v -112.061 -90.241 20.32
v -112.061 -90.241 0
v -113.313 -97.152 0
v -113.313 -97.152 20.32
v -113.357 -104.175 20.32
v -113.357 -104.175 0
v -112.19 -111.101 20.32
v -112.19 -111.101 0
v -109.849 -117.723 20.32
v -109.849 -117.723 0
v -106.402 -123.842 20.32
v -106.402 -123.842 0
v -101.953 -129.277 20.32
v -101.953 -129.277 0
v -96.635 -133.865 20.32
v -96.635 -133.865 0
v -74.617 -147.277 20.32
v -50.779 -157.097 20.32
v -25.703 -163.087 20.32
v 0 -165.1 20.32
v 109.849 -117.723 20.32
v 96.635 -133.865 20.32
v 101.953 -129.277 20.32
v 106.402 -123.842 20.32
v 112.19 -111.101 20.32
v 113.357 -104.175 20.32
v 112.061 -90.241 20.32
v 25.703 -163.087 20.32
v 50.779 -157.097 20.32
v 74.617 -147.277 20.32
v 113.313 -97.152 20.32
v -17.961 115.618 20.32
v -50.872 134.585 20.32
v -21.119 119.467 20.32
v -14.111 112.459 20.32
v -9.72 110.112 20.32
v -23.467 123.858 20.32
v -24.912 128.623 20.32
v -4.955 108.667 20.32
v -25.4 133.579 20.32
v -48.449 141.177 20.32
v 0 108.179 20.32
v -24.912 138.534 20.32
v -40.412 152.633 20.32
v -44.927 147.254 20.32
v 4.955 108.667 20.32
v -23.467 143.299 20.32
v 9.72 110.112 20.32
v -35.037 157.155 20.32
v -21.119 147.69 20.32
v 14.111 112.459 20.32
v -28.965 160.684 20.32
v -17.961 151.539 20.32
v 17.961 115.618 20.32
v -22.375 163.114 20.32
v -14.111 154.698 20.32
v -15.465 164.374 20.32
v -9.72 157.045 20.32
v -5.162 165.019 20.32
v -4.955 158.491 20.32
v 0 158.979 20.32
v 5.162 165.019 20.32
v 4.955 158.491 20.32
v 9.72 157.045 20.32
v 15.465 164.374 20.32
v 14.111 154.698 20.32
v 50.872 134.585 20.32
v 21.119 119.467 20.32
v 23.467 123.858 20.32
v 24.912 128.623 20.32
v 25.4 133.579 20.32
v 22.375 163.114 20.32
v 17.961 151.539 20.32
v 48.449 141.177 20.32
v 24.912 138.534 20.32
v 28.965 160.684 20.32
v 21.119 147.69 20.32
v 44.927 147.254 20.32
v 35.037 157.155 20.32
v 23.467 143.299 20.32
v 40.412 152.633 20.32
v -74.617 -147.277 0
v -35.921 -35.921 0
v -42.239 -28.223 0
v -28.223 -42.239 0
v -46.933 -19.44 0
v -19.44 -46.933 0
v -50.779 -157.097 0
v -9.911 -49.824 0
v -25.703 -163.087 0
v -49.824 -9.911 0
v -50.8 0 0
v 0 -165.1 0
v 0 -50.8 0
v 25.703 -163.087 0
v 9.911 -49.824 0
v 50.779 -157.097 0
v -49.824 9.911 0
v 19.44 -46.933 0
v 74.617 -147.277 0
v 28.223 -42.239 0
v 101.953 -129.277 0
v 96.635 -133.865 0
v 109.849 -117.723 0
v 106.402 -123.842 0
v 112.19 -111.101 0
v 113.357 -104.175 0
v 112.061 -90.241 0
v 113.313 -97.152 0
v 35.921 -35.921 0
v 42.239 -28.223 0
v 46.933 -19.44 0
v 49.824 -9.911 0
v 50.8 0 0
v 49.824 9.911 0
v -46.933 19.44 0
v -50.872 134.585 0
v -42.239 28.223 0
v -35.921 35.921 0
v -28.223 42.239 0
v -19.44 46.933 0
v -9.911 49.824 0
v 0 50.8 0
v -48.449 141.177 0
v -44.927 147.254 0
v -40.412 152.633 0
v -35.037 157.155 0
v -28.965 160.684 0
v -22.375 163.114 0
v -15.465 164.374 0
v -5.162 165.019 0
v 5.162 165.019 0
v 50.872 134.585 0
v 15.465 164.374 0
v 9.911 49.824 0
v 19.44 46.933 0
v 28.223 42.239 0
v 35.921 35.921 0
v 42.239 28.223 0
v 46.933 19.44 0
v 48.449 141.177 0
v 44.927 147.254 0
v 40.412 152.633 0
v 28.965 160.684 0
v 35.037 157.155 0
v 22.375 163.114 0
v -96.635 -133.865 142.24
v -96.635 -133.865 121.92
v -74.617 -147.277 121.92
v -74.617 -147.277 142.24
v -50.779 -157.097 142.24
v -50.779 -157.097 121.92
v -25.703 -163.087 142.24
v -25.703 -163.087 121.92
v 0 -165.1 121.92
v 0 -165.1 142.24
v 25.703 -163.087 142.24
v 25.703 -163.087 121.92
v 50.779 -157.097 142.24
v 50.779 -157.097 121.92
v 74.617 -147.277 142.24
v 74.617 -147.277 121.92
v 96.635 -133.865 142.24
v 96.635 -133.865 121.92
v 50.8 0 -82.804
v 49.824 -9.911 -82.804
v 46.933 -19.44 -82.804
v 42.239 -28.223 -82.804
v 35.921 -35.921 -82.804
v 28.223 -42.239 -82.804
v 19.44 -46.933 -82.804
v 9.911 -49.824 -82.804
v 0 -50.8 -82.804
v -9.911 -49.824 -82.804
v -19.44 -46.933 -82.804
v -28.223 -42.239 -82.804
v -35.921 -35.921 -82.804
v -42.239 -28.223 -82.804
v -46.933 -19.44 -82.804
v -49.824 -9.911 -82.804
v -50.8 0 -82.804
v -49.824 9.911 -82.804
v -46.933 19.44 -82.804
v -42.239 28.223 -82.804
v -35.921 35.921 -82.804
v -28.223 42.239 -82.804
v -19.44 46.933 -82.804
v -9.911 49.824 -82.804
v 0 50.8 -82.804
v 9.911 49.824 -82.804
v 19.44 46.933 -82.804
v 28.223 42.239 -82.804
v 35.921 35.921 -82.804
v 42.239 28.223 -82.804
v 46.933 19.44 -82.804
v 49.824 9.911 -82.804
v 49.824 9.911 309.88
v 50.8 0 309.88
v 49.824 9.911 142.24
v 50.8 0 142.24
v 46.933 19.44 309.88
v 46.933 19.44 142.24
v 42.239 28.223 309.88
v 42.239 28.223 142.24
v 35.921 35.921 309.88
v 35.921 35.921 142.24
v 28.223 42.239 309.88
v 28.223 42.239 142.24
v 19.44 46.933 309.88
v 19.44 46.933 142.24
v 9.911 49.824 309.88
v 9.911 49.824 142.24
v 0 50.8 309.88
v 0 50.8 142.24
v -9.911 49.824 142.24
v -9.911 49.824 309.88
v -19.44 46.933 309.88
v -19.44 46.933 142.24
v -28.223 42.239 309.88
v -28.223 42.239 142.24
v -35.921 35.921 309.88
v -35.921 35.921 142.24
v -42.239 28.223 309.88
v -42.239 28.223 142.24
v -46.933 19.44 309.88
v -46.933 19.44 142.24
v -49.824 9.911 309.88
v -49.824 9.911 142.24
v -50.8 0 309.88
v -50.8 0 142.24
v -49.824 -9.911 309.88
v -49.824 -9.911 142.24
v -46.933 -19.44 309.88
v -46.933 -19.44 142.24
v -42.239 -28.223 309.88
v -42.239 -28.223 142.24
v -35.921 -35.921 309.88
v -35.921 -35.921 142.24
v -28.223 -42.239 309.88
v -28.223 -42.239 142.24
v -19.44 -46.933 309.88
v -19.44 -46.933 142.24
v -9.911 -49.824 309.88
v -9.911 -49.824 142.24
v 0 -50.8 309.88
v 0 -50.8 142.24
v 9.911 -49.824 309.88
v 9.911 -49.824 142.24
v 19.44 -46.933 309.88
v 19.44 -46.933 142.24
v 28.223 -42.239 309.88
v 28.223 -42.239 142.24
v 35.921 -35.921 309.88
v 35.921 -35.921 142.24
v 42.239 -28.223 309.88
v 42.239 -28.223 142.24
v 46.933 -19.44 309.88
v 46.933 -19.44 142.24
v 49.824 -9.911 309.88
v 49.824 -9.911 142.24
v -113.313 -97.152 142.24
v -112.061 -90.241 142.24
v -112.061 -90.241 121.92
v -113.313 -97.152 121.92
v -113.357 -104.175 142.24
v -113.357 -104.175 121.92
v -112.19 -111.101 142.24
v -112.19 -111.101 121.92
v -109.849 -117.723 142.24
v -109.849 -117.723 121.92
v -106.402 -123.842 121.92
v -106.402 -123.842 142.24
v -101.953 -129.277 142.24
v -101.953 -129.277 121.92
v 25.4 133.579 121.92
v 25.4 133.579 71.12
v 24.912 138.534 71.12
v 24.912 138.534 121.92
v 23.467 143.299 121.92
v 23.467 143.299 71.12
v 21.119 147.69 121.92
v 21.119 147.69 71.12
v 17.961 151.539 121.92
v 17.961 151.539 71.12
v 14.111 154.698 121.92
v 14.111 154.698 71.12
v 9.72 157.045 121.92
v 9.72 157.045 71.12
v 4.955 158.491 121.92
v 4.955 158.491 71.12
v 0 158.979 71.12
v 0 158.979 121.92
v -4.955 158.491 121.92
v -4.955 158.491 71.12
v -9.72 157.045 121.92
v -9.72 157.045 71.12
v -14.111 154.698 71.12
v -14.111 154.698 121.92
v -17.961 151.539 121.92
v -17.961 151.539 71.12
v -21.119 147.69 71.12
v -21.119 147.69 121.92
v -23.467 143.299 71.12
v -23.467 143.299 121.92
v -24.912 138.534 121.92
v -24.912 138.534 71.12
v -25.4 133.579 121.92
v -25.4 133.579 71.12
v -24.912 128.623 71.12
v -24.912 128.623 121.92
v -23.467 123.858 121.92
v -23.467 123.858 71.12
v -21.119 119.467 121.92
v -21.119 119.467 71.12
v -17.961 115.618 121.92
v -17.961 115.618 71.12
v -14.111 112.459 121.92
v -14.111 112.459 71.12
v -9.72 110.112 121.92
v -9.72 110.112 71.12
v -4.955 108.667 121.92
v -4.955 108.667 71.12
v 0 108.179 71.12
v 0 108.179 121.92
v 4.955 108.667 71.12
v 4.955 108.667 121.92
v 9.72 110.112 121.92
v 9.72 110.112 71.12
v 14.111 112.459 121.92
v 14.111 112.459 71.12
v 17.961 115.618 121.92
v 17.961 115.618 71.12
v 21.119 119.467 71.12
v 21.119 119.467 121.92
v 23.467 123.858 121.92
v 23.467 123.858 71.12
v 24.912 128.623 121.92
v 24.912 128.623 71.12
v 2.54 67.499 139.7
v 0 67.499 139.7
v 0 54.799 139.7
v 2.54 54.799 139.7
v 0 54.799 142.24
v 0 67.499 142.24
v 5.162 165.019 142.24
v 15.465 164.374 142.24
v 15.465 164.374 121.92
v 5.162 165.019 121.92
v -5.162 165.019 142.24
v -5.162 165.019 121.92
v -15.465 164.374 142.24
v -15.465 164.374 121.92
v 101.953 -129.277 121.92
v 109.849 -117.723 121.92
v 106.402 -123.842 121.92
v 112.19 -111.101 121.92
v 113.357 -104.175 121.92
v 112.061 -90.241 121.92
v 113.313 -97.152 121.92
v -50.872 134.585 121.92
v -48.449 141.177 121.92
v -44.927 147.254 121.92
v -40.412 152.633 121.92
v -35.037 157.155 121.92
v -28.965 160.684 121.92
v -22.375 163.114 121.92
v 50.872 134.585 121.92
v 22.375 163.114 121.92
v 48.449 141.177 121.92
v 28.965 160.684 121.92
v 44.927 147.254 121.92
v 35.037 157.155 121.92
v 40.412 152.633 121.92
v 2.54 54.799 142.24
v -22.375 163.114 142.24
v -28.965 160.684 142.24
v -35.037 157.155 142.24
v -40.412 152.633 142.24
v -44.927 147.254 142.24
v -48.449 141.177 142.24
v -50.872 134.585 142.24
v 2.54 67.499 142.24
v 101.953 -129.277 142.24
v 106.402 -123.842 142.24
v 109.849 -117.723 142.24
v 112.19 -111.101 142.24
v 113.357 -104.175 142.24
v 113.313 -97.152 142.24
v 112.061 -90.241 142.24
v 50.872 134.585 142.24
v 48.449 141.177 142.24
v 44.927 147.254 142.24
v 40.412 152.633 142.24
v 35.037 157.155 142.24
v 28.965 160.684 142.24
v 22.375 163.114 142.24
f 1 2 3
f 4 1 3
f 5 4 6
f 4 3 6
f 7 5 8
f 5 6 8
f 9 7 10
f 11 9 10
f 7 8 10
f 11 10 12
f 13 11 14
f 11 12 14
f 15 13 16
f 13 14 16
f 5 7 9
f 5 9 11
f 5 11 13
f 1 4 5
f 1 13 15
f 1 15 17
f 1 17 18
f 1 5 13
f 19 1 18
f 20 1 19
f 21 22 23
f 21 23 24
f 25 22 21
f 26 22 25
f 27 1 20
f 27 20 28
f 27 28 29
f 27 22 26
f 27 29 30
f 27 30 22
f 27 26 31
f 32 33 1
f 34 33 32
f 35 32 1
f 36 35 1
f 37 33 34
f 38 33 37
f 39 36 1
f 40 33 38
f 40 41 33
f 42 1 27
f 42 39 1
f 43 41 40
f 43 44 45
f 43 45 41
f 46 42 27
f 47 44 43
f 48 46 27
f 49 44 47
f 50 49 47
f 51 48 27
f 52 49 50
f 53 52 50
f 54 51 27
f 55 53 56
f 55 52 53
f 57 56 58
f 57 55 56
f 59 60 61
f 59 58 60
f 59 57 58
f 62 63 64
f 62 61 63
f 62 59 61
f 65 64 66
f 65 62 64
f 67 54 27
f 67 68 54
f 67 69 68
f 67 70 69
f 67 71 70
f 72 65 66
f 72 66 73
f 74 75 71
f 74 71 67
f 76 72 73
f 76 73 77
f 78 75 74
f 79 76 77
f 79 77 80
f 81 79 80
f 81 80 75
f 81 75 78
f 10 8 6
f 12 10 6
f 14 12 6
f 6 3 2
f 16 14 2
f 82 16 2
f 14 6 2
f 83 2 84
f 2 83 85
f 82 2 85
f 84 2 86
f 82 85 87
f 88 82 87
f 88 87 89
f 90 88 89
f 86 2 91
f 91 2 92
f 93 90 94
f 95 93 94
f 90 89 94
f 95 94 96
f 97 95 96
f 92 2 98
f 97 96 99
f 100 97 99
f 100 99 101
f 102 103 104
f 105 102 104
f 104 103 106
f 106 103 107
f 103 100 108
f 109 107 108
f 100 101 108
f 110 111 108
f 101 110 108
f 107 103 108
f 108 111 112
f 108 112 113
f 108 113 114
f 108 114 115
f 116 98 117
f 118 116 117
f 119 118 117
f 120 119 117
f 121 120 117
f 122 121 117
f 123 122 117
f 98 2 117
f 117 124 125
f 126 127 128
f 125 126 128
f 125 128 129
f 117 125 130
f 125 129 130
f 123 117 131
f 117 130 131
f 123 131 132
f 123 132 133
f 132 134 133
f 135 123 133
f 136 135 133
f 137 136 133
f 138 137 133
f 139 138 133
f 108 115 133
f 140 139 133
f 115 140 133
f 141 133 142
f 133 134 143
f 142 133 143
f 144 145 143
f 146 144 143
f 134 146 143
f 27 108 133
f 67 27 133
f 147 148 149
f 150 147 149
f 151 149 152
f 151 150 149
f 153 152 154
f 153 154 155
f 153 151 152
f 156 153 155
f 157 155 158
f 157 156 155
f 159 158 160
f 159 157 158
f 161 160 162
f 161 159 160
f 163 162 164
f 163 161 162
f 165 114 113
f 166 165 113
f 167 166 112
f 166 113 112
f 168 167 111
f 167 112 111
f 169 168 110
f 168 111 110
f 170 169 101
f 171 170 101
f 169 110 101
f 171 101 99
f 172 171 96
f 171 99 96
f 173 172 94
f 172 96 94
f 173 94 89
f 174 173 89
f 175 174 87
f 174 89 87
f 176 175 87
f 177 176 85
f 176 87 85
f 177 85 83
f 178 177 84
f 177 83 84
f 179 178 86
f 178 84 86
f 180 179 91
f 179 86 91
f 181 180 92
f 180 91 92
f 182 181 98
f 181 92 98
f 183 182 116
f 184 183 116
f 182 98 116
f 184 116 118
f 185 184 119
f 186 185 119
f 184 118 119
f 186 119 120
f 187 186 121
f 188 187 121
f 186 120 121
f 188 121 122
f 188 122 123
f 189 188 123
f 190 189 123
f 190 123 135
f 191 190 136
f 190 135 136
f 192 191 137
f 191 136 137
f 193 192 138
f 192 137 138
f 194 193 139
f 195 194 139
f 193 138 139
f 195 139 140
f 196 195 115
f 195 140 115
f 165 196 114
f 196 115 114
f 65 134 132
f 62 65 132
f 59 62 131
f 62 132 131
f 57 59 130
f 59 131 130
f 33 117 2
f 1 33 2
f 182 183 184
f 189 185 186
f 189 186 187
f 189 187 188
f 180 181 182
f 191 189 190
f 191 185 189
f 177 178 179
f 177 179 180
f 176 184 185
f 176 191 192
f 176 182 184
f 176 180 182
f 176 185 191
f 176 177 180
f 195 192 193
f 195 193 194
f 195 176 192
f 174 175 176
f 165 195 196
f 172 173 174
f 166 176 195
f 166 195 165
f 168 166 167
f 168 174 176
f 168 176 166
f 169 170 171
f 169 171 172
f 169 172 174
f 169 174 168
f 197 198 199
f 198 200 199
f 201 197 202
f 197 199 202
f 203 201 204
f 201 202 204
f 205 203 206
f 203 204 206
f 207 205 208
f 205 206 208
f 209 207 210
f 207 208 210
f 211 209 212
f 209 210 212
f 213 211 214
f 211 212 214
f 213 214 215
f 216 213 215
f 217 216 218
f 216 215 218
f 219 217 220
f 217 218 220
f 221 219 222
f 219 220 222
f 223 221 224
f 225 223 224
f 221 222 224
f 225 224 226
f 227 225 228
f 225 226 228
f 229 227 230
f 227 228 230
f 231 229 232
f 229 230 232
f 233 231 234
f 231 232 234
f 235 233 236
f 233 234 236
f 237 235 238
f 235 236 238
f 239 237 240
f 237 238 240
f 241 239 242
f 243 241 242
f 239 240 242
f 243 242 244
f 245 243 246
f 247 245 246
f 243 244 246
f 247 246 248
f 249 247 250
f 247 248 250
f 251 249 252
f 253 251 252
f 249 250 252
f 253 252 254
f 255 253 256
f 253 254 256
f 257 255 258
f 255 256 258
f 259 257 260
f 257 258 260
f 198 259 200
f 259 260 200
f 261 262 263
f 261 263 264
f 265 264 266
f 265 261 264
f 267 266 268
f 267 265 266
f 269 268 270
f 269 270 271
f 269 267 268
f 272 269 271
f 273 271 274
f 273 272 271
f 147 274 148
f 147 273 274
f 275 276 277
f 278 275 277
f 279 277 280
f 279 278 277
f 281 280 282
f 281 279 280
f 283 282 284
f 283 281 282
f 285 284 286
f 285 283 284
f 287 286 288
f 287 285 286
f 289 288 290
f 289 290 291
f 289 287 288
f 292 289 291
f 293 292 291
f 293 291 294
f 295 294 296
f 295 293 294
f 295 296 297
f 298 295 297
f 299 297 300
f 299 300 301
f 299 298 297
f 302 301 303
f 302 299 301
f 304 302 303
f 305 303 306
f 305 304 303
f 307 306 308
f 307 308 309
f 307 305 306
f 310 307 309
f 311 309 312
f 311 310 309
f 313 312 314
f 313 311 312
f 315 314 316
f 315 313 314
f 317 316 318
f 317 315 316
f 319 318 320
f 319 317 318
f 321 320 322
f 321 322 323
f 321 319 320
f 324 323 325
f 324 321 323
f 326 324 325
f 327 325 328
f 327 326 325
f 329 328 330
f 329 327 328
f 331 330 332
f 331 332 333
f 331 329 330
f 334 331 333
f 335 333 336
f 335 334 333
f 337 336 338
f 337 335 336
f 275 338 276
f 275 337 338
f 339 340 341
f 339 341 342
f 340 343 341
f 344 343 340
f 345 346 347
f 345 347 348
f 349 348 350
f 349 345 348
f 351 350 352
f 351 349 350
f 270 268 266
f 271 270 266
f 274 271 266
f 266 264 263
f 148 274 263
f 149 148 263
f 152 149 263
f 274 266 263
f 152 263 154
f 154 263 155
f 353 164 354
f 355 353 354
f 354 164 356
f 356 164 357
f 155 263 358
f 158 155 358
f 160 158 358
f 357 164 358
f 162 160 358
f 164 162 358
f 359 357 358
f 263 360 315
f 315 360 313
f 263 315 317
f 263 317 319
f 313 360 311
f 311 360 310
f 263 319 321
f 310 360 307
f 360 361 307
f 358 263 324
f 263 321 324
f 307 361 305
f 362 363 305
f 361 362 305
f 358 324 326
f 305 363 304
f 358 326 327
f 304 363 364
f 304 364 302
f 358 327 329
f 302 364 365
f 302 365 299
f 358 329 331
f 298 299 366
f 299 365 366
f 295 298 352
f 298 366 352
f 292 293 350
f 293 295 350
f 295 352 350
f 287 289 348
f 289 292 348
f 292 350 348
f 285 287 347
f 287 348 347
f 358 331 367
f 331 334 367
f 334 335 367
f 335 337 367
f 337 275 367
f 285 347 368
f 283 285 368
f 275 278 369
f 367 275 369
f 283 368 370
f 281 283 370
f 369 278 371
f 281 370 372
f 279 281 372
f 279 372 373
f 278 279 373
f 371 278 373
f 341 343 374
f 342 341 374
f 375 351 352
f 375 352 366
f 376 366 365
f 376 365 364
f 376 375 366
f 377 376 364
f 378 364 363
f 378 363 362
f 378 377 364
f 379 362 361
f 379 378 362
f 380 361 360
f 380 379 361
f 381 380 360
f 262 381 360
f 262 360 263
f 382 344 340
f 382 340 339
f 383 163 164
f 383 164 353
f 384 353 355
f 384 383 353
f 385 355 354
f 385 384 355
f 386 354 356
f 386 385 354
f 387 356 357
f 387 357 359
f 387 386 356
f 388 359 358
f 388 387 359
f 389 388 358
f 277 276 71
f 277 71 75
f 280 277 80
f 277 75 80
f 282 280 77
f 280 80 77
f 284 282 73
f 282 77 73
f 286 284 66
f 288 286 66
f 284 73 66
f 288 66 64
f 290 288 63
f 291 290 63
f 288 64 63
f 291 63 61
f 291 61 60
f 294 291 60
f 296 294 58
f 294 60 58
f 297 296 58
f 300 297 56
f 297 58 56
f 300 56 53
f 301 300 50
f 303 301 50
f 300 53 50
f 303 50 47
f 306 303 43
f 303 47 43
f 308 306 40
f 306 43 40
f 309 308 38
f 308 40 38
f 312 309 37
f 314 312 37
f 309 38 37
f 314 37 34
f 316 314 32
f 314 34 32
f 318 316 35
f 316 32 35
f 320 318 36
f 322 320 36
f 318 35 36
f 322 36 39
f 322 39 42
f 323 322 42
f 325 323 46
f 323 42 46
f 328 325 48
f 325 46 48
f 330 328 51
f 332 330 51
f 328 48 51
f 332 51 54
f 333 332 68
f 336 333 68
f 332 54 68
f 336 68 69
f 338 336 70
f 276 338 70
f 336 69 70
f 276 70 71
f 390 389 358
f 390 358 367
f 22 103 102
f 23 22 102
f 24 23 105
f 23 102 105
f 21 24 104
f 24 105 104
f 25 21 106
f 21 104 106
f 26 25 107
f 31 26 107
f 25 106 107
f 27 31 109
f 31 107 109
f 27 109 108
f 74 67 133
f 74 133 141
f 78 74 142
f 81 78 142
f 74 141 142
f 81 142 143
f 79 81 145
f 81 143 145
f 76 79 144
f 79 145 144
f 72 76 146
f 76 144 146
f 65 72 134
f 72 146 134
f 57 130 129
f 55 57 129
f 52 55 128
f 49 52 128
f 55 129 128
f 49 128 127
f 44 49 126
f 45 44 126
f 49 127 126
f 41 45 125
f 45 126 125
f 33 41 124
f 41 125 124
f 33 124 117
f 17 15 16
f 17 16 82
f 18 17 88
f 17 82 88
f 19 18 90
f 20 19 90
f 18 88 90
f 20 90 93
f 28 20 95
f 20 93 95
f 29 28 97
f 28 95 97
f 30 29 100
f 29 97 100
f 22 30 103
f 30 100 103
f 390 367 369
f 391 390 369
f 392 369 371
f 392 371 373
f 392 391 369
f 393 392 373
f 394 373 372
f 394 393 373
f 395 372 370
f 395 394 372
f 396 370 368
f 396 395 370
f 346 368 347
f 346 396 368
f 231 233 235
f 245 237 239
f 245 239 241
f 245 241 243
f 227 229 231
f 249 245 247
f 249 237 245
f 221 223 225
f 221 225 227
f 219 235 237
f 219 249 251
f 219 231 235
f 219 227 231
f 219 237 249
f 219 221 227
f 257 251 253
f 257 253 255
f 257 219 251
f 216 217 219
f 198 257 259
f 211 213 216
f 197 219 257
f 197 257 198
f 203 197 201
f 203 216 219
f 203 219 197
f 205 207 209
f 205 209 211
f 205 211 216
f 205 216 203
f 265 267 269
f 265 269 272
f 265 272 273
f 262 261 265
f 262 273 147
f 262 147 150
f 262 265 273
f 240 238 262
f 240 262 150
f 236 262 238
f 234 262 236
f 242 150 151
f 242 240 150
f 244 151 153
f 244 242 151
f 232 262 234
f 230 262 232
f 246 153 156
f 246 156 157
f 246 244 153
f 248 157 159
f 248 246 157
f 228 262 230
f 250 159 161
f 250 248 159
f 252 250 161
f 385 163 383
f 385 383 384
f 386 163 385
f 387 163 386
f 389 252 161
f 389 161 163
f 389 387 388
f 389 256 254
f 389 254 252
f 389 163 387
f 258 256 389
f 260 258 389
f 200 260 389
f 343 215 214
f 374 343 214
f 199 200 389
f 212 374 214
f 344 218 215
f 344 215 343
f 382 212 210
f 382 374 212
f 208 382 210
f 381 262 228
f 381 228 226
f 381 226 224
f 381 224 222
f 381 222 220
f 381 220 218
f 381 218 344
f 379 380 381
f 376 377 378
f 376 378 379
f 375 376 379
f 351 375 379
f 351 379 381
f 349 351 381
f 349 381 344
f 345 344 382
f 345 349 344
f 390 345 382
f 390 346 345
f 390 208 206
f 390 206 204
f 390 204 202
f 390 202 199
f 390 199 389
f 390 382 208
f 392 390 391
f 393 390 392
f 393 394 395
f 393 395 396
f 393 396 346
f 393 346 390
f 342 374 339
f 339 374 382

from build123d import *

# Parameters (mm, degrees)
BOSS_EXTRUDE1_DEPTH = 20.32
SKETCH2_R           = 25.4
BOSS_EXTRUDE2_DEPTH = 50.8
SKETCH4_R           = 50.8
BOSS_EXTRUDE3_DEPTH = 82.804
SKETCH5_R           = 50.8
BOSS_EXTRUDE4_DEPTH = 84.836
SKETCH6_W           = 2.54
SKETCH6_H           = 12.7
CUT_EXTRUDE1_DEPTH  = 2.54


with BuildPart() as part:
    # Sketch1 → Boss-Extrude1 (new body)
    with BuildSketch(Plane.XY):
        with BuildLine():
            Line((-50.872217321, 134.585225504), (-112.061443675, -90.240779366))
            ThreePointArc((-112.061443675, -90.240779366), (-111.162689162, -114.462461255), (-96.634871694, -133.864526939))
            ThreePointArc((-96.634871694, -133.864526939), (0, -165.1), (96.634871694, -133.864526939))
            ThreePointArc((96.634871694, -133.864526939), (111.162689162, -114.462461255), (112.061443675, -90.240779366))
            Line((112.061443675, -90.240779366), (50.872217321, 134.585225504))
            ThreePointArc((50.872217321, 134.585225504), (37.822210961, 155.010576595), (15.465489796, 164.374050949))
            ThreePointArc((15.465489796, 164.374050949), (0, 165.1), (-15.465489796, 164.374050949))
            ThreePointArc((-15.465489796, 164.374050949), (-37.822210961, 155.010576595), (-50.872217321, 134.585225504))
        make_face()
    extrude(amount=BOSS_EXTRUDE1_DEPTH)

    # Sketch2 → Boss-Extrude2 (add)
    with BuildSketch(Plane.XY.offset(20.32)):
        with Locations((0, 133.5786)):
            Circle(SKETCH2_R)
    extrude(amount=BOSS_EXTRUDE2_DEPTH)

    # Sketch4 → Boss-Extrude3 (add)
    with BuildSketch(Plane(origin=(0, 0, 0), x_dir=(-1, 0, 0), z_dir=(0, 0, -1))):
        with Locations(Location((0, 0, 0), (0, 0, 180))):
            Circle(SKETCH4_R)
    extrude(amount=BOSS_EXTRUDE3_DEPTH)

    # Mirror1: part across plane


with BuildPart() as part_1:
    add(part.part)
    add(part.part.mirror(Plane(origin=(0, 133.5786, 71.12), x_dir=(1, 0, 0), z_dir=(0, 0, 1))))

    # Sketch5 → Boss-Extrude4 (add)
    with BuildSketch(Plane.XY.offset(225.044)):
        Circle(SKETCH5_R)
    extrude(amount=BOSS_EXTRUDE4_DEPTH)

    # Sketch6 → Cut-Extrude1 (cut)
    with BuildSketch(Plane.XY.offset(142.24)):
        with Locations((1.27, 61.148656496)):
            Rectangle(SKETCH6_W, SKETCH6_H)
    extrude(amount=-CUT_EXTRUDE1_DEPTH, mode=Mode.SUBTRACT)


solid = part_1.part
